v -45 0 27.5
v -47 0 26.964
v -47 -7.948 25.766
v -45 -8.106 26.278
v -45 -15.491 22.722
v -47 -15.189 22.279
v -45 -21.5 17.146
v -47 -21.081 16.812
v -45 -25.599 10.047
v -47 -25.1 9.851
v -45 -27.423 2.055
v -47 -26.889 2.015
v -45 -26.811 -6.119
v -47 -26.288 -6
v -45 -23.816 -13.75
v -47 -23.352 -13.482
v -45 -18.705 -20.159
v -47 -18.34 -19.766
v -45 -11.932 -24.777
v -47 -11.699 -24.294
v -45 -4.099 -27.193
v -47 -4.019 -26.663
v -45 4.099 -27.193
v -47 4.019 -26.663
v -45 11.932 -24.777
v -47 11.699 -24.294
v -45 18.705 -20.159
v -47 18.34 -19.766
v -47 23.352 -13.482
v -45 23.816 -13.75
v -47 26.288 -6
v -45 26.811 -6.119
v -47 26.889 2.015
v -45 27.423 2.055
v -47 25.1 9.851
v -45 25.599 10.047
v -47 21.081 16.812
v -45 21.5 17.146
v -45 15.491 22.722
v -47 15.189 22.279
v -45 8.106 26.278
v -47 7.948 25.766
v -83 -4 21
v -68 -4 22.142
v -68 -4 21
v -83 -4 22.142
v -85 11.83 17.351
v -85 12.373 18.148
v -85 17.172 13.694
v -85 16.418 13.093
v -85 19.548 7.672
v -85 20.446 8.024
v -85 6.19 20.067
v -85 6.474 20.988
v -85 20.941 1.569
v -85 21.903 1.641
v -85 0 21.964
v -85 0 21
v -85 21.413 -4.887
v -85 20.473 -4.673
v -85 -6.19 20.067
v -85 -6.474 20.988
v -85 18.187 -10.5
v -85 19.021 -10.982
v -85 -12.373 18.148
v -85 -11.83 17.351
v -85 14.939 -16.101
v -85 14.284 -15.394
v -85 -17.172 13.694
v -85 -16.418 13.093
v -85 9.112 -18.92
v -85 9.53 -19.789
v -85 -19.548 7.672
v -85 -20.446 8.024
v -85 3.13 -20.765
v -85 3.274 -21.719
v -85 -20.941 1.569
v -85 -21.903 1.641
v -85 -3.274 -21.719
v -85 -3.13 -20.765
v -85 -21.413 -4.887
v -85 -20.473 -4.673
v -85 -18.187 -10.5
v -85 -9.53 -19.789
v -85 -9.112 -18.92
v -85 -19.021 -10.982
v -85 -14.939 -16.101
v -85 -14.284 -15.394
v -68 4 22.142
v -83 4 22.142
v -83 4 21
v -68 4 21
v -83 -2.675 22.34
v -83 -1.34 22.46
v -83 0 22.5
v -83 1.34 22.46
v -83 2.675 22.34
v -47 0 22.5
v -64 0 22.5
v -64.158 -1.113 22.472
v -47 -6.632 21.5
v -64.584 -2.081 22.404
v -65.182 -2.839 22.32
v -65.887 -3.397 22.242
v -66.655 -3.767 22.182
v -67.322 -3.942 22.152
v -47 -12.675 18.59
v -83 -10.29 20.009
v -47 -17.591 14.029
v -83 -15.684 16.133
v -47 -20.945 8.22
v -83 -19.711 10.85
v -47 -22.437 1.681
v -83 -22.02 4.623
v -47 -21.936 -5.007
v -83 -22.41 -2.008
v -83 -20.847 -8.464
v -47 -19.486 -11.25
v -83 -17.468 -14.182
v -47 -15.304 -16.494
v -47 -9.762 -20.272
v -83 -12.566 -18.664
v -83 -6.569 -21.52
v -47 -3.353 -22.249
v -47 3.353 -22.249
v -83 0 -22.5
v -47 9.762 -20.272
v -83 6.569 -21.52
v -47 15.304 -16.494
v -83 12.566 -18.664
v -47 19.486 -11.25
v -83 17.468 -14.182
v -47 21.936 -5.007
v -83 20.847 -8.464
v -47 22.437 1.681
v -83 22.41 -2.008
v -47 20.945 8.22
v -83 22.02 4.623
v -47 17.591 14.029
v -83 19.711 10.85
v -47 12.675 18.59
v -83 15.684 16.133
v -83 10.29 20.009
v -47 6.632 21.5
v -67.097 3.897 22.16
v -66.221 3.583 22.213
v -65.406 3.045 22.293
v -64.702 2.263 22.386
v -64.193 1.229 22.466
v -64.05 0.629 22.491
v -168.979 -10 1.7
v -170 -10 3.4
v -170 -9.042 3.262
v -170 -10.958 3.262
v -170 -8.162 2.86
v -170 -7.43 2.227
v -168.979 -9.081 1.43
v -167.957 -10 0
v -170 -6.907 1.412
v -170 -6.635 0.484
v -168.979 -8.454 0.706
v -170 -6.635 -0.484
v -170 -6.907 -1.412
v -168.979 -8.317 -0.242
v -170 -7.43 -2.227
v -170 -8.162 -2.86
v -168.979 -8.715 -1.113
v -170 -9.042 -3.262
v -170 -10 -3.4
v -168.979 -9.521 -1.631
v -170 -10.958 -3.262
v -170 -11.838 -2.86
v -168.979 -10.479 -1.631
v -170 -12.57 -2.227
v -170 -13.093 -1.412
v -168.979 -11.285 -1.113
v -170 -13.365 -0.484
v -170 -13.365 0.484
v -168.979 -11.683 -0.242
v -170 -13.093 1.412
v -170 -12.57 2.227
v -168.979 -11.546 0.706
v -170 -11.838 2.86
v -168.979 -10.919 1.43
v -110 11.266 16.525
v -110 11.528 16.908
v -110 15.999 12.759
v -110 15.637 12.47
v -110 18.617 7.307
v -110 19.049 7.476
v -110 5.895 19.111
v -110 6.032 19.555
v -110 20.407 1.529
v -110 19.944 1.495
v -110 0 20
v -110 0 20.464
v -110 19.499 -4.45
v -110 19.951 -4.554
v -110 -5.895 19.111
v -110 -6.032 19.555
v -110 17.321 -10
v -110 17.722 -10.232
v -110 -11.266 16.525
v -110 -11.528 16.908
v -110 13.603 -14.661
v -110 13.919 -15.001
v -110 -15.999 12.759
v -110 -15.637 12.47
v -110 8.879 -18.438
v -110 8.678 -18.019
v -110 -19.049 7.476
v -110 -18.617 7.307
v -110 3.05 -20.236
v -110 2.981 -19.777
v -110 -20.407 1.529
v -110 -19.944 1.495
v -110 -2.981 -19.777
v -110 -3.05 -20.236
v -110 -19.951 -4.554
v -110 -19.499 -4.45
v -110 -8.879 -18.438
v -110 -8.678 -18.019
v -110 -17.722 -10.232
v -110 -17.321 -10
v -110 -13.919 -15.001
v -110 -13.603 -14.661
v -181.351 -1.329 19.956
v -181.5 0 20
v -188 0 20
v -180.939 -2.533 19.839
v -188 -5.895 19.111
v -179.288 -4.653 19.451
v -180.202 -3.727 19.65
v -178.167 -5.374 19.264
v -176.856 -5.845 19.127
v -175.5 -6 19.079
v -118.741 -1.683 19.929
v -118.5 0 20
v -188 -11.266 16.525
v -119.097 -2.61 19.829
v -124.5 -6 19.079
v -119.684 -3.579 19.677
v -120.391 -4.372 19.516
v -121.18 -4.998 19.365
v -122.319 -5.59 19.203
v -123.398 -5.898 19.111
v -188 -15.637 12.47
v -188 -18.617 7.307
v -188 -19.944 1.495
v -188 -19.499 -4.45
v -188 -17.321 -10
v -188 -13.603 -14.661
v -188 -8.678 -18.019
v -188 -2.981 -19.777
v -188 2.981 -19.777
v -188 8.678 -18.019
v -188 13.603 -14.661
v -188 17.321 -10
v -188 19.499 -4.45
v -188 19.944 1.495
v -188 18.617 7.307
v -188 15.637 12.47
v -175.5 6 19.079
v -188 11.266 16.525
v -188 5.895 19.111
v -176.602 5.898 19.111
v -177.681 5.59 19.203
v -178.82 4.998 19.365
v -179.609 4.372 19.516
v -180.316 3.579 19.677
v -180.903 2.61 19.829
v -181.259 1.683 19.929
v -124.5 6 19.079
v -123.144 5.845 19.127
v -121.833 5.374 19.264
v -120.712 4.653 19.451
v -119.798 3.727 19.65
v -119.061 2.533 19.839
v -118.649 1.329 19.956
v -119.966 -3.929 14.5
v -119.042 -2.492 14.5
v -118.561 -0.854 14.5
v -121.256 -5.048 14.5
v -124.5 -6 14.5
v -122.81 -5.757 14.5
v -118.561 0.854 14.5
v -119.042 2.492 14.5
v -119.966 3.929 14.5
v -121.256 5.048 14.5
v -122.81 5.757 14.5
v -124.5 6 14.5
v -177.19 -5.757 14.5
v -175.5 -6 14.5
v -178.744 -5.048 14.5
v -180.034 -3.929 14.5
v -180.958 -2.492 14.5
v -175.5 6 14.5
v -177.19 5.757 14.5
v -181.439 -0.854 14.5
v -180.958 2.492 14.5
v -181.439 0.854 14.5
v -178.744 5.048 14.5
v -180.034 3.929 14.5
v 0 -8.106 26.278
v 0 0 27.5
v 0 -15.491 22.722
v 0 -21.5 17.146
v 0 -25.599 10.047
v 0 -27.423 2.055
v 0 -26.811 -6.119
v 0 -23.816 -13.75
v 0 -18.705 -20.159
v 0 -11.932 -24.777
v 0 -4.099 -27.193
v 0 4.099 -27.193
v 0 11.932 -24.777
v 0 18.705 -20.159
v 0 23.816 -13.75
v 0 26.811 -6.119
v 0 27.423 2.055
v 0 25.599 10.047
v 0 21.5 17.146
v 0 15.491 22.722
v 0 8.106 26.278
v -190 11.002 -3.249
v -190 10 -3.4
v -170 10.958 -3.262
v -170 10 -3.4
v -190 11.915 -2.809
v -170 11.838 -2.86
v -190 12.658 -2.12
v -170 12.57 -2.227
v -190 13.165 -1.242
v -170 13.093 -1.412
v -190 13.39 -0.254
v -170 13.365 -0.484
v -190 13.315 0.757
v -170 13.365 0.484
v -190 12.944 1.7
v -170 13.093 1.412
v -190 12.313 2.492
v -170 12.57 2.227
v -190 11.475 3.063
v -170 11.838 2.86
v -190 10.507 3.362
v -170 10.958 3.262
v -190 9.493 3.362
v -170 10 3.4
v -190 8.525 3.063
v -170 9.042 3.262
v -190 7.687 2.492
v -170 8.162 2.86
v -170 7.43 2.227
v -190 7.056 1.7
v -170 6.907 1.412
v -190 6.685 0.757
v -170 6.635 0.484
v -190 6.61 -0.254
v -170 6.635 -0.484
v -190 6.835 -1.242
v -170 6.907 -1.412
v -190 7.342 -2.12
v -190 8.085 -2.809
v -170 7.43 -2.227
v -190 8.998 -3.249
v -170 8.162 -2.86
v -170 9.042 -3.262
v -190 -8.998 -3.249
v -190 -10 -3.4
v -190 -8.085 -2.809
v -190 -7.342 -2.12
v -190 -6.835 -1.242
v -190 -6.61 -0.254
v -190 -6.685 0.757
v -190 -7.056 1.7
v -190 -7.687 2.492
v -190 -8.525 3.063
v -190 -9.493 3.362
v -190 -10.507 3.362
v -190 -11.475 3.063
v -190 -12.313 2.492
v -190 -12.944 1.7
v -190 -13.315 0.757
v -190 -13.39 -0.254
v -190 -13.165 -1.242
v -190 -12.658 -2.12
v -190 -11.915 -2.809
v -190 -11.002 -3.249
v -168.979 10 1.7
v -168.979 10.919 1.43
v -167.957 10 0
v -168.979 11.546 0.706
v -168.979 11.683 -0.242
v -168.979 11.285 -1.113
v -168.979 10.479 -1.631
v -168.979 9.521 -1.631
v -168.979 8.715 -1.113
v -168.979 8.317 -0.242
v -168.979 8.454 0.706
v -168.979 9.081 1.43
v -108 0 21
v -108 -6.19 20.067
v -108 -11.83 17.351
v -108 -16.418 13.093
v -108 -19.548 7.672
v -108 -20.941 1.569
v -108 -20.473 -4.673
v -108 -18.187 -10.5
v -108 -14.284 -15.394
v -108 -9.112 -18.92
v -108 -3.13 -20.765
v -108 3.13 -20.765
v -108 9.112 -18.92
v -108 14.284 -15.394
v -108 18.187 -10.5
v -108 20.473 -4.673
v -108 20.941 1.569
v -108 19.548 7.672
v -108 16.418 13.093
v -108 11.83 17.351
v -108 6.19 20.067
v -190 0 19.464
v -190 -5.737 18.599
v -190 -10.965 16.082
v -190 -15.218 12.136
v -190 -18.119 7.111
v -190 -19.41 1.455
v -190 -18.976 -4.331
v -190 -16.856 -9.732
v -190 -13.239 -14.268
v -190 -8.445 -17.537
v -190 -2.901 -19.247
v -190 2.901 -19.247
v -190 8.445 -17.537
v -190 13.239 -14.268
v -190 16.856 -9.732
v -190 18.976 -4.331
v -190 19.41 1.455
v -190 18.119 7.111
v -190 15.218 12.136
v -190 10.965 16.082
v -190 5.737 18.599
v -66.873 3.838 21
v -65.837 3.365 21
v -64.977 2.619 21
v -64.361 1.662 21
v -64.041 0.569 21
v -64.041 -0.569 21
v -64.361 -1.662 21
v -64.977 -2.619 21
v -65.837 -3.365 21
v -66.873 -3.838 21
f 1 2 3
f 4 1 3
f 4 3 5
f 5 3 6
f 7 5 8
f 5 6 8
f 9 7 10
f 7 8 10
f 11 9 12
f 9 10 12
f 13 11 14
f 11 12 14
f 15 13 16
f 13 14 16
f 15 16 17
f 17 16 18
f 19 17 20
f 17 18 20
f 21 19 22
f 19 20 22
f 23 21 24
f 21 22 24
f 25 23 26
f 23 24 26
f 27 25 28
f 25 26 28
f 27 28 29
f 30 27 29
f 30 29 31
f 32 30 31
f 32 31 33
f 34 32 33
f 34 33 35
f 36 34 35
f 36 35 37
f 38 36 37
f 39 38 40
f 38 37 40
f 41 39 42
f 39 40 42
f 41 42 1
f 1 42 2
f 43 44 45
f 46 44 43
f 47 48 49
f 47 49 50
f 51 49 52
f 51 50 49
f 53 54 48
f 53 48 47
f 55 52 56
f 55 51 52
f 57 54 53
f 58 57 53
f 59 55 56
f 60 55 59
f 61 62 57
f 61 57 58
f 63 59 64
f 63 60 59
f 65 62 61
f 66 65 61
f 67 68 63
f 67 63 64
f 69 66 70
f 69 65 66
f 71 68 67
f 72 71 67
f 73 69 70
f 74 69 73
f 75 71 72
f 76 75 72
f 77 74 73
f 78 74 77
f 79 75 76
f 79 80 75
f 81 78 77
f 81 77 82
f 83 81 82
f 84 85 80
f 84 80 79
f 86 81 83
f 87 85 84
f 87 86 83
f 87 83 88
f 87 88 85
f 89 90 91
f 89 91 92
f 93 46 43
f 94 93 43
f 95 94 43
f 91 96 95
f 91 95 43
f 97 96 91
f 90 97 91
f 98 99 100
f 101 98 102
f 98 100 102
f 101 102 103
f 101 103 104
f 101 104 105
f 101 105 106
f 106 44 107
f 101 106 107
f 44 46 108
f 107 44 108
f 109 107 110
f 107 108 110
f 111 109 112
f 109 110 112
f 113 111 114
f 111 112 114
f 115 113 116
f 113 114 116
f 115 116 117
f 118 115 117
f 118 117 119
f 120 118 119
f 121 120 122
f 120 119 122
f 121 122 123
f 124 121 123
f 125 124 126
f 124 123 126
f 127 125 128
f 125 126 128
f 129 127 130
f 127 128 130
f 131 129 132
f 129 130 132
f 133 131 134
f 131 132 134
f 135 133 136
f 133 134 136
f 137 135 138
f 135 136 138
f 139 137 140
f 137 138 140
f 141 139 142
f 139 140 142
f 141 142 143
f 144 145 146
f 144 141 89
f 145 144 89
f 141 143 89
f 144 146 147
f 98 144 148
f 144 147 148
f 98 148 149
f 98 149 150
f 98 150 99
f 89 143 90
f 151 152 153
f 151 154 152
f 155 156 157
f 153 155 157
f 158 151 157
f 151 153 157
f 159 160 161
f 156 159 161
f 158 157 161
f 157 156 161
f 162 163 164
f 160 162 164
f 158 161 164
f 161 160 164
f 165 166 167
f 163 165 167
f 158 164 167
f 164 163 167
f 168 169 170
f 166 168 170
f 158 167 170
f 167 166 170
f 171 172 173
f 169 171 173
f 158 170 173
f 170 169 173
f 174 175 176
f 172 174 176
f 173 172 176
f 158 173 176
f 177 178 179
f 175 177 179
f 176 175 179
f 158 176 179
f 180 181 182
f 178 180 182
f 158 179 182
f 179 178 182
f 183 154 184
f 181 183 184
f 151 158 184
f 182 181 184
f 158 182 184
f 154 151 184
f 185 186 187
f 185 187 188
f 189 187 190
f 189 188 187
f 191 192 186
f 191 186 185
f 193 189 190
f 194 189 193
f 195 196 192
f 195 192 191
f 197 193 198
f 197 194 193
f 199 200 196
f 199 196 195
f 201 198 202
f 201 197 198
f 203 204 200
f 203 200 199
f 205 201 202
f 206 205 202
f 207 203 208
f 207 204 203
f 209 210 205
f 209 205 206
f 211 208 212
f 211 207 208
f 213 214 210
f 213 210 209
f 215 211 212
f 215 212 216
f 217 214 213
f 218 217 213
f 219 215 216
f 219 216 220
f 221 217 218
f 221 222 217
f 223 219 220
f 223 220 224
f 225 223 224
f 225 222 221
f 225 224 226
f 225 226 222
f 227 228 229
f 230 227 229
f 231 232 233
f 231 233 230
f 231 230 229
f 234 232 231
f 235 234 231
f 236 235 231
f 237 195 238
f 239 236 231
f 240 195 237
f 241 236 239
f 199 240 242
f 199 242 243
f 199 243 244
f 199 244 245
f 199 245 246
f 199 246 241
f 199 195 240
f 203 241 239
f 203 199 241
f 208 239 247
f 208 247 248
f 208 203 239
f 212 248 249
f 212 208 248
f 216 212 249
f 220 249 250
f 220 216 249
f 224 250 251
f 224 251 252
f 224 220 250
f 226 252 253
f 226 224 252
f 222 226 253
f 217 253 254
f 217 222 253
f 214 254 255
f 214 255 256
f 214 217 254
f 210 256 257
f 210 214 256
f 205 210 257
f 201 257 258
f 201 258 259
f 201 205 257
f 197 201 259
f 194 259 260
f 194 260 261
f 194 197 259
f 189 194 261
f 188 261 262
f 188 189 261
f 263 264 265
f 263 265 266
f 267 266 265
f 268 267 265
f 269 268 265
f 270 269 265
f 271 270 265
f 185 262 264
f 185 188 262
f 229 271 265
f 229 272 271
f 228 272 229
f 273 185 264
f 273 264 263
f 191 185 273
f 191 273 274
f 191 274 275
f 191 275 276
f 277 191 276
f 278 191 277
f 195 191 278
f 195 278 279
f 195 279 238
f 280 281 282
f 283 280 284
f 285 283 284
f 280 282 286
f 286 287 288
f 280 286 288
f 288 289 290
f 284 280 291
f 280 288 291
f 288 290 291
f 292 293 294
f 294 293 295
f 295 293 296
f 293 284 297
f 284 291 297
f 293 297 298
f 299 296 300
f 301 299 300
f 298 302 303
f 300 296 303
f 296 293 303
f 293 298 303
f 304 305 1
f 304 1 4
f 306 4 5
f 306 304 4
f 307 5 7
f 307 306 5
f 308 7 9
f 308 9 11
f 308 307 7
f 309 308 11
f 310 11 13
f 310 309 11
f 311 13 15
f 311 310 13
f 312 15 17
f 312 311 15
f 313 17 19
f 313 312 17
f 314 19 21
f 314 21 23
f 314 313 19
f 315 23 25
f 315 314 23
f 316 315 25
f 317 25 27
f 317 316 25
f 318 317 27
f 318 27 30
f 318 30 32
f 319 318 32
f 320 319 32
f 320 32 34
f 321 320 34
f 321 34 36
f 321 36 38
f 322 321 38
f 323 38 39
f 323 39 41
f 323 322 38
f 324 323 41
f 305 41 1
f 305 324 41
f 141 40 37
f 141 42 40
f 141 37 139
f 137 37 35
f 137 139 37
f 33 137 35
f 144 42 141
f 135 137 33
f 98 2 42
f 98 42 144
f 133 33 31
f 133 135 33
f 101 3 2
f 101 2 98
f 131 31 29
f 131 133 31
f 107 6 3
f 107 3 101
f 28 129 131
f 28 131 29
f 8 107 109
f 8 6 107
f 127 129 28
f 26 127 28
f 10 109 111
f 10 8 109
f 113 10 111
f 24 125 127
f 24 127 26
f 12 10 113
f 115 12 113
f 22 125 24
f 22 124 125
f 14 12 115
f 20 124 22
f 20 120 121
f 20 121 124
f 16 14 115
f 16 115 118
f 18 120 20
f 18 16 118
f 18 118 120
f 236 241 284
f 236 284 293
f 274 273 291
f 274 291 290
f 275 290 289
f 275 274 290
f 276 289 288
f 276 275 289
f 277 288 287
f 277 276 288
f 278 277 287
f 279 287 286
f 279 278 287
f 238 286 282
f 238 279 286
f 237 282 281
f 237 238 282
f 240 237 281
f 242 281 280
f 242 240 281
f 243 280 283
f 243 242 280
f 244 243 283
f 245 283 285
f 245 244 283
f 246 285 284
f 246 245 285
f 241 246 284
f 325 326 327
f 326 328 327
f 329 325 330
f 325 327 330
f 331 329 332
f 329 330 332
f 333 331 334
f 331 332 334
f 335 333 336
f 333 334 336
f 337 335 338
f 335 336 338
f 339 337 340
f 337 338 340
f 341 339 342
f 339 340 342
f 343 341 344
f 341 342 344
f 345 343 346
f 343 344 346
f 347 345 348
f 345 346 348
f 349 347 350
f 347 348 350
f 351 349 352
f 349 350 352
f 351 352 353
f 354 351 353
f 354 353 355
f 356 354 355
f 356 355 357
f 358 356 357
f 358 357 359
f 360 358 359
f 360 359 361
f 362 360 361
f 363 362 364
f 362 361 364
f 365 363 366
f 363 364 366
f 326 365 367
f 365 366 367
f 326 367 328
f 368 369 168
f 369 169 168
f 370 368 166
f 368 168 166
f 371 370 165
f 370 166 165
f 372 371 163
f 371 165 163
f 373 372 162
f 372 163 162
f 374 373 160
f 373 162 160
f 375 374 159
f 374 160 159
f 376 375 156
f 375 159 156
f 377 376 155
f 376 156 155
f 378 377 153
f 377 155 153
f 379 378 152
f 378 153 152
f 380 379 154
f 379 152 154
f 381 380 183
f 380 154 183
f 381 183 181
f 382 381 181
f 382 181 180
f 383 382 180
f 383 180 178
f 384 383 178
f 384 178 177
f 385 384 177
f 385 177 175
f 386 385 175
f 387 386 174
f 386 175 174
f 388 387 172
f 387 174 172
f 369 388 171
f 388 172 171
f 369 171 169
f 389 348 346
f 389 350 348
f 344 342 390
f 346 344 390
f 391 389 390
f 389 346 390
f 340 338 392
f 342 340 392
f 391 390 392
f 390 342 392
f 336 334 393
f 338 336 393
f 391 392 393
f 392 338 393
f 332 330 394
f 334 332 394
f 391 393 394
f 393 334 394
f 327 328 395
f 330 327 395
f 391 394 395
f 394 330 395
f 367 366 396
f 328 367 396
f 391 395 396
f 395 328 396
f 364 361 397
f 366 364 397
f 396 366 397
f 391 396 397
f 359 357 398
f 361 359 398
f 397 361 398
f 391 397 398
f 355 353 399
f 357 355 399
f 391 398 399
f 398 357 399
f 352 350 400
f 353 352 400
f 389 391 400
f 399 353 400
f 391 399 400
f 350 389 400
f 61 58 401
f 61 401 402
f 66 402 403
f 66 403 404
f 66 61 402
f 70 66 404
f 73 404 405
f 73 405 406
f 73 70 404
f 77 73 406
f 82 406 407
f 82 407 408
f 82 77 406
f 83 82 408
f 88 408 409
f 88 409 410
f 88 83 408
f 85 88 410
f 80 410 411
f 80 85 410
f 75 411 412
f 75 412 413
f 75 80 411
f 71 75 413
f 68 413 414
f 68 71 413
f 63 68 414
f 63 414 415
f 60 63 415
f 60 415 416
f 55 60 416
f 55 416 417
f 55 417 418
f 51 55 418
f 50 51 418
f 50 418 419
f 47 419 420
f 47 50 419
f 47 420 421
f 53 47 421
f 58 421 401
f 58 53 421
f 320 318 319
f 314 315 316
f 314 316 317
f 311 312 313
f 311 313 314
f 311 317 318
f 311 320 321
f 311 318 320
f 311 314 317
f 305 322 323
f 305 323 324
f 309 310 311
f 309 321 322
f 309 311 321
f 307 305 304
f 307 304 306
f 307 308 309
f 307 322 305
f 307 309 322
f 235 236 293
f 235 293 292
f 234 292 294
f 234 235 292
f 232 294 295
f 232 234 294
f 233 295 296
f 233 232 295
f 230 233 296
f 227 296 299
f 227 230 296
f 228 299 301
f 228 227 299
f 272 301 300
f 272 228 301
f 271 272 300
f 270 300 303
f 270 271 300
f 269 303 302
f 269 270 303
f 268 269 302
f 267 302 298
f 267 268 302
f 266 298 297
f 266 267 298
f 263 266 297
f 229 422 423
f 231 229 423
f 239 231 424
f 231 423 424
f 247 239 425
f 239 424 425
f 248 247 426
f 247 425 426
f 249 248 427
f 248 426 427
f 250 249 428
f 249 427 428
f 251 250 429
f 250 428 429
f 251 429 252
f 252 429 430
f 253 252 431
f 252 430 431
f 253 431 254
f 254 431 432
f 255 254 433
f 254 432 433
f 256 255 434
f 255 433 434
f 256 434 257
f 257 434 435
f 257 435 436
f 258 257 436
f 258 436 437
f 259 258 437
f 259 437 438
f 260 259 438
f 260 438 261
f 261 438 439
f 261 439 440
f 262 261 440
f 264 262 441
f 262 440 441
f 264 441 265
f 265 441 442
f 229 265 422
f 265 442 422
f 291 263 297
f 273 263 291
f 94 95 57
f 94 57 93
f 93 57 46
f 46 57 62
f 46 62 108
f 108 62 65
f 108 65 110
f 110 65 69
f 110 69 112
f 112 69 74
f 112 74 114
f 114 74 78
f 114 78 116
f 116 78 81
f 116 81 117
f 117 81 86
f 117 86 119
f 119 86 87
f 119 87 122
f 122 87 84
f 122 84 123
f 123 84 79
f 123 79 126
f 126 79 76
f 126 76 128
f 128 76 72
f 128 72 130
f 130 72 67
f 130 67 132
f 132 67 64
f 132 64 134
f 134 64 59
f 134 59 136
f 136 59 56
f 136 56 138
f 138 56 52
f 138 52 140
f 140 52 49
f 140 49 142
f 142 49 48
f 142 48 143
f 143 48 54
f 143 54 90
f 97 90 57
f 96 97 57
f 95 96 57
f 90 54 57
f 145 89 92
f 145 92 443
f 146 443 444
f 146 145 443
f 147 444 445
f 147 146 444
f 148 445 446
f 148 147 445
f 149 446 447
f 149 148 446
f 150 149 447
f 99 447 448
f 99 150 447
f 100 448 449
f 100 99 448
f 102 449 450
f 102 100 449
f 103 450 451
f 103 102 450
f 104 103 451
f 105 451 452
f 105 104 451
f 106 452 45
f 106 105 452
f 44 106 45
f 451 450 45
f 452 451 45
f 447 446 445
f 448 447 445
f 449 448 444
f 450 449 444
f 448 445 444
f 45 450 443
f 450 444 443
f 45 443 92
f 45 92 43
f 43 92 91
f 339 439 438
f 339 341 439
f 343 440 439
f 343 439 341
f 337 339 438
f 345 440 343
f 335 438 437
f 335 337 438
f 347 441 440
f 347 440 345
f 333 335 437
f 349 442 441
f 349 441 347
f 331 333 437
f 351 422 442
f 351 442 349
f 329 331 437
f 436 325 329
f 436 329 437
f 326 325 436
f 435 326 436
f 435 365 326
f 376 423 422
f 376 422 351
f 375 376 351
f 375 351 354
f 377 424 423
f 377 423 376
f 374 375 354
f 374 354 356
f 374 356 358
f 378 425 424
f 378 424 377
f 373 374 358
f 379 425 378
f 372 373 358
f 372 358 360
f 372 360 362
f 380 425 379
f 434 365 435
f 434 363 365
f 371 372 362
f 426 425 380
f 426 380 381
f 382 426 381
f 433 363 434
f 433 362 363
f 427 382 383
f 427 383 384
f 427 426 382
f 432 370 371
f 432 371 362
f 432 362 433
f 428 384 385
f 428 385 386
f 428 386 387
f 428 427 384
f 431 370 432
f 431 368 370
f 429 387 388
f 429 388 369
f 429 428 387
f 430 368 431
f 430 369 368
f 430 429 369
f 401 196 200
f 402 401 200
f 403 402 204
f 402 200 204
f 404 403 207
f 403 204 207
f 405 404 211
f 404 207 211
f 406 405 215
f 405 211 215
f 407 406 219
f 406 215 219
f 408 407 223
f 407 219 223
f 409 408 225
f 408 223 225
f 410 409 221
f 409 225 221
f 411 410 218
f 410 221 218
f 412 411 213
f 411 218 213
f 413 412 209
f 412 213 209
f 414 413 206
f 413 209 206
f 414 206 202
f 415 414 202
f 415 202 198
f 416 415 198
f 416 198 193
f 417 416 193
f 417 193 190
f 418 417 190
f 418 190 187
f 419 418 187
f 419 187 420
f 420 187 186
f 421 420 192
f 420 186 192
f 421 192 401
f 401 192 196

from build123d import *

# Parameters (mm, degrees)
FASE1_SIZE                      = 2
FASE1_SIZE2                     = 0.535898385
FASE1_PART_2_SIZE               = 2
FASE1_PART_2_SIZE2              = 0.535898385
FASE1_PART_3_SIZE               = 2
FASE1_PART_3_SIZE2              = 0.535898385
SCHNITT_LINEAR_AUSTRAGEN1_DEPTH = 5.5
M8_GEWINDEBOHRUNG1_D            = 6.8
M8_GEWINDEBOHRUNG1_DEPTH        = 20
M8_GEWINDEBOHRUNG1_TIP          = 2.042926105
FASE2_SIZE                      = 2
FASE2_SIZE2                     = 0.535898385
SCHNITT_LINEAR_AUSTRAGEN2_DEPTH = 1.5


with BuildPart() as part:
    # Skizze1 → Rotation1 (revolve)
    with BuildSketch(Plane.XY, mode=Mode.PRIVATE) as rotation1_sk:
        Polygon((-85, 22.5), (-70, 22.5), (-47, 22.5), (-47, 27.5), (0, 27.5), (0, 0), (-190, 0), (-190, 20), (-110, 20), (-110, 21), (-85, 21), align=None)
    revolve(rotation1_sk.sketch.rotate(Axis((-55.076928245, 0, 0), (1, 0, 0)), 90), axis=Axis((-55.076928245, 0, 0), (1, 0, 0)))  # turned: the seam where the file's is

    # Fase1
    fase1_edges = [part.edges().sort_by_distance(p)[0] for p in [
        (-47, 0, -27.5),
    ]]
    fase1_side = [part.faces().sort_by_distance(p)[0] for p in [
        (-23.5, 0, -27.5),
    ]]
    chamfer(fase1_edges, length=FASE1_SIZE, length2=FASE1_SIZE2, reference=fase1_side[0])

    # Fase1 part 2
    fase1_part_2_edges = [part.edges().sort_by_distance(p)[0] for p in [
        (-85, 0, -22.5),
    ]]
    fase1_part_2_side = [part.faces().sort_by_distance(p)[0] for p in [
        (-66, 0, -22.5),
    ]]
    chamfer(fase1_part_2_edges, length=FASE1_PART_2_SIZE, length2=FASE1_PART_2_SIZE2, reference=fase1_part_2_side[0])

    # Fase1 part 3
    fase1_part_3_edges = [part.edges().sort_by_distance(p)[0] for p in [
        (-110, 0, -21),
    ]]
    fase1_part_3_side = [part.faces().sort_by_distance(p)[0] for p in [
        (-97.5, 0, -21),
    ]]
    chamfer(fase1_part_3_edges, length=FASE1_PART_3_SIZE, length2=FASE1_PART_3_SIZE2, reference=fase1_part_3_side[0])

    # Skizze2 → Schnitt-Linear austragen1 (cut)
    with BuildSketch(Plane.XY.offset(20)):
        with BuildLine():
            Line((-175.5, 6), (-124.5, 6))
            ThreePointArc((-124.5, 6), (-118.5, 0), (-124.5, -6))
            Line((-124.5, -6), (-175.5, -6))
            ThreePointArc((-175.5, -6), (-181.5, 0), (-175.5, 6))
        make_face()
    extrude(amount=-SCHNITT_LINEAR_AUSTRAGEN1_DEPTH, mode=Mode.SUBTRACT)

    # M8 Gewindebohrung1
    with Locations(Plane.ZY.offset(190)):
        with Locations((0, 10), (0, -10)):
            Hole(M8_GEWINDEBOHRUNG1_D / 2, depth=M8_GEWINDEBOHRUNG1_DEPTH)
            with Locations((0, 0, -(M8_GEWINDEBOHRUNG1_DEPTH + M8_GEWINDEBOHRUNG1_TIP / 2))):  # 118° drill point
                Cone(0, M8_GEWINDEBOHRUNG1_D / 2, M8_GEWINDEBOHRUNG1_TIP, mode=Mode.SUBTRACT)

    # Fase2
    fase2_edges = [part.edges().sort_by_distance(p)[0] for p in [
        (-190, 0, -20),
    ]]
    fase2_side = [part.faces().sort_by_distance(p)[0] for p in [
        (-150, 0, -20),
    ]]
    chamfer(fase2_edges, length=FASE2_SIZE, length2=FASE2_SIZE2, reference=fase2_side[0])

    # Skizze8 → Schnitt-Linear austragen2 (cut)
    with BuildSketch(Plane.XY.offset(22.5)):
        with BuildLine():
            Line((-83, 4), (-68, 4))
            ThreePointArc((-68, 4), (-64, 0), (-68, -4))
            Line((-68, -4), (-83, -4))
            Line((-83, -4), (-83, 4))
        make_face()
    extrude(amount=-SCHNITT_LINEAR_AUSTRAGEN2_DEPTH, mode=Mode.SUBTRACT)


solid = part.part
